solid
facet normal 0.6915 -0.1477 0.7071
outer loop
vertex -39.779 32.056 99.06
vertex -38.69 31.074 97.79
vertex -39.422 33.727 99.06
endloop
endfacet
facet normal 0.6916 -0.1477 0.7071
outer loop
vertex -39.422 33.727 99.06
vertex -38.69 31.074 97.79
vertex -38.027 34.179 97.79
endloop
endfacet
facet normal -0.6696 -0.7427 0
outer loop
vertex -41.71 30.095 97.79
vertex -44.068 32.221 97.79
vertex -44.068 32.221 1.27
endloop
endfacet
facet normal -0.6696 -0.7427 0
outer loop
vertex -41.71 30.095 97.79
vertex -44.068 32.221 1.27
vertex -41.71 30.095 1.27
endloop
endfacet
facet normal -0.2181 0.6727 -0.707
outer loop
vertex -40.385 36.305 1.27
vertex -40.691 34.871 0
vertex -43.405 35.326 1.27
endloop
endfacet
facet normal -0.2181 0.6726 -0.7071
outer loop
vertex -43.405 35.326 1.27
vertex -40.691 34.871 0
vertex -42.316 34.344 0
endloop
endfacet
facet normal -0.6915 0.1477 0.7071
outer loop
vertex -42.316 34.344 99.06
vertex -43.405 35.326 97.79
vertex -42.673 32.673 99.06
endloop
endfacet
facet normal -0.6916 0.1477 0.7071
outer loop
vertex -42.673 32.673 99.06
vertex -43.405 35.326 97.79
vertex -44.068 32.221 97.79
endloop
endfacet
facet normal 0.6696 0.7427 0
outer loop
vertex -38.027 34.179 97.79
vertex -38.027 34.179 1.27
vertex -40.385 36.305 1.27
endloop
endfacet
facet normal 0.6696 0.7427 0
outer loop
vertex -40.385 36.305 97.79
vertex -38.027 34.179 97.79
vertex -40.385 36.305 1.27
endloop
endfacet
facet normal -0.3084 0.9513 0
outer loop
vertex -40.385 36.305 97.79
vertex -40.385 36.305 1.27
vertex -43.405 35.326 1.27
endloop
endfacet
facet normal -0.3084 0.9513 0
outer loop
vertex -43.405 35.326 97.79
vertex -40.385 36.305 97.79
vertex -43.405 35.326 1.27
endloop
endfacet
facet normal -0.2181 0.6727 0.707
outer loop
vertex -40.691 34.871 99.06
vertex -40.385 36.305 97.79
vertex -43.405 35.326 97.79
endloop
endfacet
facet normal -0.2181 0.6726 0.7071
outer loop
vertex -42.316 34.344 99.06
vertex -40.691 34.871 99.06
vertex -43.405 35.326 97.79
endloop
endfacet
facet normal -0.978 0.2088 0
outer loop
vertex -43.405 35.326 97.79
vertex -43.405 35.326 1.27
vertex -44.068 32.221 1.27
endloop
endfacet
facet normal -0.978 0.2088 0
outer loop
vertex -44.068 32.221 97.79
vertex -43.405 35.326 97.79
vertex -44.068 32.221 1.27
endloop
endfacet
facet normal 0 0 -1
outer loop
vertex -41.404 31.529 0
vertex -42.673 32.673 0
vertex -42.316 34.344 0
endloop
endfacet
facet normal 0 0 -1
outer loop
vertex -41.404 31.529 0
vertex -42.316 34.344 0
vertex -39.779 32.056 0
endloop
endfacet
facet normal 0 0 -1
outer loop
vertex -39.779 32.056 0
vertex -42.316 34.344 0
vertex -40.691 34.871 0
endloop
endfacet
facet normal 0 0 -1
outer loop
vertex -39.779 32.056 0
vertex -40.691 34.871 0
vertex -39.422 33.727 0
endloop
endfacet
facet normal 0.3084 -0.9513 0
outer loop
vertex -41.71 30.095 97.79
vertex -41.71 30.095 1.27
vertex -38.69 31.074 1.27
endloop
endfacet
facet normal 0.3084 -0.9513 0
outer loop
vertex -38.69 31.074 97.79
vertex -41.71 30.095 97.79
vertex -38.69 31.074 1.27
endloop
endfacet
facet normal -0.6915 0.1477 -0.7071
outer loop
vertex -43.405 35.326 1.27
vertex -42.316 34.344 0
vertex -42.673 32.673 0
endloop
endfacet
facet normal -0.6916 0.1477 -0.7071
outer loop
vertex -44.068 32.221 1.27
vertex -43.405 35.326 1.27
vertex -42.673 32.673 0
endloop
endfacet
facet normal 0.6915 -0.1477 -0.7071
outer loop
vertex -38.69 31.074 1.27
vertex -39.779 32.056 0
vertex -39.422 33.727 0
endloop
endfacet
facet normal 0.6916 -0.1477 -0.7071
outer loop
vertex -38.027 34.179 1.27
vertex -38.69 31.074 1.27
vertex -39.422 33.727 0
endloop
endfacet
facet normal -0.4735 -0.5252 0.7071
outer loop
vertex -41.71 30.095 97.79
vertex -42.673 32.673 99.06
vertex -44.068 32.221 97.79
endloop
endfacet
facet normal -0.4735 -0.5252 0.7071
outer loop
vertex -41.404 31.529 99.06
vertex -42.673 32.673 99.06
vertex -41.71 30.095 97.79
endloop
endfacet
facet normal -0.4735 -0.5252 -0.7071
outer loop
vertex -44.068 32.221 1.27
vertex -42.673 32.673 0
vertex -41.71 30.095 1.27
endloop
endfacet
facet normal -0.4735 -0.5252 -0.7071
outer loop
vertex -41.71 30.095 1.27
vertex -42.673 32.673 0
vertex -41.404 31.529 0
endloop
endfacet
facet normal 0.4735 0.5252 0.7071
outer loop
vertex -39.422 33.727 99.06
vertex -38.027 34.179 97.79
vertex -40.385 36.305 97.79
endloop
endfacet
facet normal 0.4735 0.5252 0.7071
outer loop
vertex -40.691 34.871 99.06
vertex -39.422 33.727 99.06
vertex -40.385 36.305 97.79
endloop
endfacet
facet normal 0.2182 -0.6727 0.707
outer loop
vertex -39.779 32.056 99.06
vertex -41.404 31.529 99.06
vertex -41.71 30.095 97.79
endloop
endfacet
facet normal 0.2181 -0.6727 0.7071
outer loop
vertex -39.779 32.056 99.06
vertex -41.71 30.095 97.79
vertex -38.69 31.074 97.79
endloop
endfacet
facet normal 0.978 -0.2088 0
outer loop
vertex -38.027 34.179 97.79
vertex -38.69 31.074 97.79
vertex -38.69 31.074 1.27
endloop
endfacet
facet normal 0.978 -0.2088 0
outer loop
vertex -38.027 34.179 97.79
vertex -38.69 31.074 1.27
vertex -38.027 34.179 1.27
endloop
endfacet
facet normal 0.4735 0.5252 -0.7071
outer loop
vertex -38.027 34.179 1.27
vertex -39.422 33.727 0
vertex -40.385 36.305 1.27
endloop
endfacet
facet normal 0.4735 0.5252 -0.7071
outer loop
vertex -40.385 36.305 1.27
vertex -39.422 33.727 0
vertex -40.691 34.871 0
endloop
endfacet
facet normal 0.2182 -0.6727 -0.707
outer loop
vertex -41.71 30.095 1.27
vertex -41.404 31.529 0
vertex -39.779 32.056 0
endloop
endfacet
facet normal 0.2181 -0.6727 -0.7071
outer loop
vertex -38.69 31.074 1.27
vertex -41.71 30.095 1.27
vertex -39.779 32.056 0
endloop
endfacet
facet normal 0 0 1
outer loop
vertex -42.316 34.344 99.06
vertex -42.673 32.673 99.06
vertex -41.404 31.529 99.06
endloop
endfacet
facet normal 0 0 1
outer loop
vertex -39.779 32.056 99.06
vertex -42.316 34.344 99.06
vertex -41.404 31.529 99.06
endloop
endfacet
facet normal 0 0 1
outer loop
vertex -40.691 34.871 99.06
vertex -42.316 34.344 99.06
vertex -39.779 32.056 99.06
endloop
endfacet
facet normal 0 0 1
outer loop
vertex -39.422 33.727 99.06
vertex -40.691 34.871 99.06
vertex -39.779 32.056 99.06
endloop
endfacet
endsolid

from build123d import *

# Parameters (mm, degrees)
F1_DEPTH = 99.06
F2_SIZE  = 1.27
F3_SIZE  = 1.27


with BuildPart() as f1:
    # F0 (on Top) → F1 (new body)
    with BuildSketch(Plane.XY):
        Polygon((-41.710054, 30.094995), (-38.689673, 31.073729), (-38.027091, 34.178824), (-40.384891, 36.305183), (-43.405272, 35.326448), (-44.067854, 32.221354), align=None)
    extrude(amount=F1_DEPTH)

    # F2
    f2_edges = [f1.edges().sort_by_distance(p)[0] for p in [
        (-40.199863, 30.584362, 0),
        (-38.358382, 32.626277, 0),
        (-39.205991, 35.242004, 0),
        (-41.895082, 35.815816, 0),
        (-43.736563, 33.773901, 0),
        (-42.888954, 31.158174, 0),
    ]]
    chamfer(f2_edges, length=F2_SIZE)

    # F3
    f3_edges = [f1.edges().sort_by_distance(p)[0] for p in [
        (-40.199863, 30.584362, 99.06),
        (-38.358382, 32.626277, 99.06),
        (-39.205991, 35.242004, 99.06),
        (-41.895082, 35.815816, 99.06),
        (-43.736563, 33.773901, 99.06),
        (-42.888954, 31.158174, 99.06),
    ]]
    chamfer(f3_edges, length=F3_SIZE)


solid = f1.part
